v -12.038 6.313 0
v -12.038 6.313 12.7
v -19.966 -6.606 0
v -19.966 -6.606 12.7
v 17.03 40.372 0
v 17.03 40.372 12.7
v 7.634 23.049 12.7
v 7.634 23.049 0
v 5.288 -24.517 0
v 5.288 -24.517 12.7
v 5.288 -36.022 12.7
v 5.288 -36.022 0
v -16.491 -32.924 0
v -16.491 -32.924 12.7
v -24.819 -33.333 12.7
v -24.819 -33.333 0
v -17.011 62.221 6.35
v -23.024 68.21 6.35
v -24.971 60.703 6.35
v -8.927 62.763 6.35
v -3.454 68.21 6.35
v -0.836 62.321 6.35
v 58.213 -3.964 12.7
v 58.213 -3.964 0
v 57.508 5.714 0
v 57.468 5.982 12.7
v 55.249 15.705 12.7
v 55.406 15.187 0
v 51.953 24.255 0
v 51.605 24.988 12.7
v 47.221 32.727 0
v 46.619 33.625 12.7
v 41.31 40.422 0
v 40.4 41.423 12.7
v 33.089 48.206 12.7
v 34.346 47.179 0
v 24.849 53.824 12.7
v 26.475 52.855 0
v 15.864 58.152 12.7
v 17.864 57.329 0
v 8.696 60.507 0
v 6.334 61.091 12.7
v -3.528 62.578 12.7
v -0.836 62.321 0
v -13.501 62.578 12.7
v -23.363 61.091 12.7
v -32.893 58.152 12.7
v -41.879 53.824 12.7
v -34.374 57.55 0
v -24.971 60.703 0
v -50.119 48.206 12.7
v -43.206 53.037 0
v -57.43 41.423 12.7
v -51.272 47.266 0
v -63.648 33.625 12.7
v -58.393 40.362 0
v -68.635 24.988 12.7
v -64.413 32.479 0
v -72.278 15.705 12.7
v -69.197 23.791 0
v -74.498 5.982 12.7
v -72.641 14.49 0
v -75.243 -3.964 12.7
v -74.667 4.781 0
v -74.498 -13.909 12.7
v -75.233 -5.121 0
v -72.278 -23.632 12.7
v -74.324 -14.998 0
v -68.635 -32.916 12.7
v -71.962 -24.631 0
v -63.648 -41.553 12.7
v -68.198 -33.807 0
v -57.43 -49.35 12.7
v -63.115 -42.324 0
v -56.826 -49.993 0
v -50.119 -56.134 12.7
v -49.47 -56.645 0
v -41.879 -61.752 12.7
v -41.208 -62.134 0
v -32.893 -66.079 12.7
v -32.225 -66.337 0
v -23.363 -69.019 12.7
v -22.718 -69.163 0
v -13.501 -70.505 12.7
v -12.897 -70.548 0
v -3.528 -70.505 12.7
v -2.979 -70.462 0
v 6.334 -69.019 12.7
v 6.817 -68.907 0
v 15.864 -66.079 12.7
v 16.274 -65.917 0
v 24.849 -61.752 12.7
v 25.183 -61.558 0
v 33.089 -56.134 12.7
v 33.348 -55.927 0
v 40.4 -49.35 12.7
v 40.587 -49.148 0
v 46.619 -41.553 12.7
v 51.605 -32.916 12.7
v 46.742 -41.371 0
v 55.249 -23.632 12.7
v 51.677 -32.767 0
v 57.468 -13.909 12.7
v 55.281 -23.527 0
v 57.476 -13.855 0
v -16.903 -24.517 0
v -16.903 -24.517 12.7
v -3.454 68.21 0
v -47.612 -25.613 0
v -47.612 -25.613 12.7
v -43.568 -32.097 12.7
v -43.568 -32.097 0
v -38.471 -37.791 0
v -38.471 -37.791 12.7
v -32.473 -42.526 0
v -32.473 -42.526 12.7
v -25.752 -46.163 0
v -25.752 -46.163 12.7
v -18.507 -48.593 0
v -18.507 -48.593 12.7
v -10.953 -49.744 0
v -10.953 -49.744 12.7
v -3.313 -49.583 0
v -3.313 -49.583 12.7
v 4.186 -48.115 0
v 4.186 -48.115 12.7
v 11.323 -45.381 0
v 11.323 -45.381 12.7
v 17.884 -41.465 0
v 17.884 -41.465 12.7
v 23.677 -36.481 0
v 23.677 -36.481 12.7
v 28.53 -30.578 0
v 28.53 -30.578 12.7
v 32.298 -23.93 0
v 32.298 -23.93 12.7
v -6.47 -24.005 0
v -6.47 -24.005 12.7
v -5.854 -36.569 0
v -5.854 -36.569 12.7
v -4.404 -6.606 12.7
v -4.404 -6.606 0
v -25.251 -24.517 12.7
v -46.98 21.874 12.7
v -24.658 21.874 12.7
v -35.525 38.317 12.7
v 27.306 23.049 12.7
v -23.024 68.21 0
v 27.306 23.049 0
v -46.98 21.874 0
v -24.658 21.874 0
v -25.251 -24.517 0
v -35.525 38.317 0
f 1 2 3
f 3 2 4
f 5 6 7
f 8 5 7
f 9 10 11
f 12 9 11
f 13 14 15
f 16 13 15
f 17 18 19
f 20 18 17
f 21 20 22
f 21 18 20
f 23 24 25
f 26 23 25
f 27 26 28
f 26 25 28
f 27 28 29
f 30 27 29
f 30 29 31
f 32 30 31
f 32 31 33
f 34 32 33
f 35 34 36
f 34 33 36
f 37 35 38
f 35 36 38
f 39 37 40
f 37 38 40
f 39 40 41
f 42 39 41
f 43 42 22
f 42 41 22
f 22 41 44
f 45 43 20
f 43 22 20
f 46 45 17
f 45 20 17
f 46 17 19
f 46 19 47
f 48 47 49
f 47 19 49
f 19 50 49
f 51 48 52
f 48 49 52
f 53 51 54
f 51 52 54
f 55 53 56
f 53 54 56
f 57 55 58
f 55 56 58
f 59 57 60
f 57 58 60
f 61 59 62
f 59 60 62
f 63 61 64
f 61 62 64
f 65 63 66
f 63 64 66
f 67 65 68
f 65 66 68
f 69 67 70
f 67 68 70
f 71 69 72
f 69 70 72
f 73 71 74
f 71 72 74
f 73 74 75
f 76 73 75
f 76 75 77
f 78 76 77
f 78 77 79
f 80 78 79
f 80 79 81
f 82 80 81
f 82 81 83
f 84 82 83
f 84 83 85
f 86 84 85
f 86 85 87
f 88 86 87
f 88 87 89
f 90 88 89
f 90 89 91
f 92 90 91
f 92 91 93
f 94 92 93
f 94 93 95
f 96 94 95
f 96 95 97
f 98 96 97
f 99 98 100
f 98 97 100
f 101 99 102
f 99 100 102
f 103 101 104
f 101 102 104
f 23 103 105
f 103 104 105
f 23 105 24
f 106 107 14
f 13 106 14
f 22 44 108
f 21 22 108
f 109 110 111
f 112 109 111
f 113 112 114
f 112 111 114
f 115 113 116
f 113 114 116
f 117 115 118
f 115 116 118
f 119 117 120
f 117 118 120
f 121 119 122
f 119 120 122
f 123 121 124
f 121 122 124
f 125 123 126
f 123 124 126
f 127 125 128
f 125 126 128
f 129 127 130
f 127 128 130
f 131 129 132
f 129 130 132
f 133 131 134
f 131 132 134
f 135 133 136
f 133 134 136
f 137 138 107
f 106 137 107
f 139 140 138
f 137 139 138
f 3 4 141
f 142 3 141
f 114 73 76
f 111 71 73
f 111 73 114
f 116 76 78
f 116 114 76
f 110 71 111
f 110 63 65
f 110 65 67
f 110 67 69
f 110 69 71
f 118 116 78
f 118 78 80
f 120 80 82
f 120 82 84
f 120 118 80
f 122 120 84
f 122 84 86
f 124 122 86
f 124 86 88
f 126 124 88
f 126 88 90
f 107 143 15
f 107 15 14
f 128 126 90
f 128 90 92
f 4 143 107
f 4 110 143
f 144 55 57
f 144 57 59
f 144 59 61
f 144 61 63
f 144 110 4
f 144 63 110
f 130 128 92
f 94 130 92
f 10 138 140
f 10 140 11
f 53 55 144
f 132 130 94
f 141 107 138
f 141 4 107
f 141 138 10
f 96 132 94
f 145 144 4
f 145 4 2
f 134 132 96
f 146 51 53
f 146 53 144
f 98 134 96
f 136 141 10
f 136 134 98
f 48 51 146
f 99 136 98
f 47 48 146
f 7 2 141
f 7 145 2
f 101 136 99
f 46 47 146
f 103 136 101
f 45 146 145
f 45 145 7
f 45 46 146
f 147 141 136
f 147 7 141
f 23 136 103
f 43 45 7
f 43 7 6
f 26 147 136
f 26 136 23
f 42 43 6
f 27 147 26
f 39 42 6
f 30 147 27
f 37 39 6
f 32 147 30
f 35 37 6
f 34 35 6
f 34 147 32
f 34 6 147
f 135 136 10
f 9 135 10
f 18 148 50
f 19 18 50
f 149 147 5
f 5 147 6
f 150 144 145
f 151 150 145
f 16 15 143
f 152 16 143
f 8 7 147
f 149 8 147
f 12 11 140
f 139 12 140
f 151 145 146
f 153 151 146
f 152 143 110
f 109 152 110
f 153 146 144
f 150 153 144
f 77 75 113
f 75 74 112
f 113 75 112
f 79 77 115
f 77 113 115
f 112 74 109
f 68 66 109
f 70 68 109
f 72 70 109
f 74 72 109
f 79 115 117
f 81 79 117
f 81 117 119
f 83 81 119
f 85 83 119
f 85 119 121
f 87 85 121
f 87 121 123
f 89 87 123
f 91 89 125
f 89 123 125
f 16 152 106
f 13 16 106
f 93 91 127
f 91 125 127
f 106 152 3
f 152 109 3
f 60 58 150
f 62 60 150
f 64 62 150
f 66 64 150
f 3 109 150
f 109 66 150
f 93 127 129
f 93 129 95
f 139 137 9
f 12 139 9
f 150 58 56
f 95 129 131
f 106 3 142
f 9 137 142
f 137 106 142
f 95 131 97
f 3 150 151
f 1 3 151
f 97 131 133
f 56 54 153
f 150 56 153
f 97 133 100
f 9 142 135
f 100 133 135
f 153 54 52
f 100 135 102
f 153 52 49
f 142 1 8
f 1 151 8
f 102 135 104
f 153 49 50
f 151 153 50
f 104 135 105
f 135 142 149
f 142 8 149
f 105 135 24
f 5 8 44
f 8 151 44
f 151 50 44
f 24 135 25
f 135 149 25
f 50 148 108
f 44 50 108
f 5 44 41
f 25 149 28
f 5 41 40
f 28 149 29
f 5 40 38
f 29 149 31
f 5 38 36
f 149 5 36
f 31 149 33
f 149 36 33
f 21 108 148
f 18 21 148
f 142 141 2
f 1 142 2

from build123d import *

# Parameters (mm, degrees)
F0_R      = 66.728095
F1_DEPTH  = 12.7
F3_DEPTH  = 25.4
F5_DEPTH  = 25.4
F7_DEPTH  = 12.7
F9_DEPTH  = 25.4
F11_DEPTH = 6.35


with BuildPart() as f1:
    # F0 (on Top) → F1 (new body)
    with BuildSketch(Plane.XY):
        with Locations((-8.514826, -3.963798)):
            Circle(F0_R)
    extrude(amount=F1_DEPTH)

    # F2 (on face) → F3 (cut)
    with BuildSketch(Plane.XY.offset(12.7)):
        Polygon((-24.658037, 21.874294), (-35.525352, 38.316716), (-46.980087, 21.874294), align=None)
    extrude(amount=-F3_DEPTH, mode=Mode.SUBTRACT)

    # F4 (on face) → F5 (cut)
    with BuildSketch(Plane.XY.offset(12.7)):
        Polygon((27.306164, 23.048753), (17.029652, 40.372021), (7.633982, 23.048753), align=None)
    extrude(amount=-F5_DEPTH, mode=Mode.SUBTRACT)

    # F6 (on face) → F7 (cut)
    with BuildSketch(Plane.XY.offset(12.7)):
        with BuildLine():
            Line((-25.250863, -24.516826), (-47.612483, -25.613372))
            ThreePointArc((-47.612483, -25.613372), (-7.129461, -49.828593), (32.297611, -23.929598))
            Line((32.297611, -23.929598), (5.287732, -24.516826))
            Line((5.287732, -24.516826), (5.287732, -36.022174))
            Line((5.287732, -36.022174), (-5.854146, -36.568538))
            Line((-5.854146, -36.568538), (-6.470212, -24.005227))
            Line((-6.470212, -24.005227), (-16.903157, -24.516826))
            Line((-16.903157, -24.516826), (-16.49087, -32.924499))
            Line((-16.49087, -32.924499), (-24.818552, -33.332863))
            Line((-24.818552, -33.332863), (-25.250863, -24.516826))
        make_face()
    extrude(amount=-F7_DEPTH, mode=Mode.SUBTRACT)

    # F8 (on face) → F9 (cut)
    with BuildSketch(Plane.XY.offset(12.7)):
        Polygon((-4.40422, -6.606331), (-12.038202, 6.312716), (-19.965798, -6.606331), align=None)
    extrude(amount=-F9_DEPTH, mode=Mode.SUBTRACT)

    # F10 (on Top) → F11 (join)
    with BuildSketch(Plane.XY):
        Polygon((-23.02446, 68.209961), (-25.039101, 60.43921), (0, 60.43921), (-3.453669, 68.209961), align=None)
    extrude(amount=F11_DEPTH)


solid = f1.part
